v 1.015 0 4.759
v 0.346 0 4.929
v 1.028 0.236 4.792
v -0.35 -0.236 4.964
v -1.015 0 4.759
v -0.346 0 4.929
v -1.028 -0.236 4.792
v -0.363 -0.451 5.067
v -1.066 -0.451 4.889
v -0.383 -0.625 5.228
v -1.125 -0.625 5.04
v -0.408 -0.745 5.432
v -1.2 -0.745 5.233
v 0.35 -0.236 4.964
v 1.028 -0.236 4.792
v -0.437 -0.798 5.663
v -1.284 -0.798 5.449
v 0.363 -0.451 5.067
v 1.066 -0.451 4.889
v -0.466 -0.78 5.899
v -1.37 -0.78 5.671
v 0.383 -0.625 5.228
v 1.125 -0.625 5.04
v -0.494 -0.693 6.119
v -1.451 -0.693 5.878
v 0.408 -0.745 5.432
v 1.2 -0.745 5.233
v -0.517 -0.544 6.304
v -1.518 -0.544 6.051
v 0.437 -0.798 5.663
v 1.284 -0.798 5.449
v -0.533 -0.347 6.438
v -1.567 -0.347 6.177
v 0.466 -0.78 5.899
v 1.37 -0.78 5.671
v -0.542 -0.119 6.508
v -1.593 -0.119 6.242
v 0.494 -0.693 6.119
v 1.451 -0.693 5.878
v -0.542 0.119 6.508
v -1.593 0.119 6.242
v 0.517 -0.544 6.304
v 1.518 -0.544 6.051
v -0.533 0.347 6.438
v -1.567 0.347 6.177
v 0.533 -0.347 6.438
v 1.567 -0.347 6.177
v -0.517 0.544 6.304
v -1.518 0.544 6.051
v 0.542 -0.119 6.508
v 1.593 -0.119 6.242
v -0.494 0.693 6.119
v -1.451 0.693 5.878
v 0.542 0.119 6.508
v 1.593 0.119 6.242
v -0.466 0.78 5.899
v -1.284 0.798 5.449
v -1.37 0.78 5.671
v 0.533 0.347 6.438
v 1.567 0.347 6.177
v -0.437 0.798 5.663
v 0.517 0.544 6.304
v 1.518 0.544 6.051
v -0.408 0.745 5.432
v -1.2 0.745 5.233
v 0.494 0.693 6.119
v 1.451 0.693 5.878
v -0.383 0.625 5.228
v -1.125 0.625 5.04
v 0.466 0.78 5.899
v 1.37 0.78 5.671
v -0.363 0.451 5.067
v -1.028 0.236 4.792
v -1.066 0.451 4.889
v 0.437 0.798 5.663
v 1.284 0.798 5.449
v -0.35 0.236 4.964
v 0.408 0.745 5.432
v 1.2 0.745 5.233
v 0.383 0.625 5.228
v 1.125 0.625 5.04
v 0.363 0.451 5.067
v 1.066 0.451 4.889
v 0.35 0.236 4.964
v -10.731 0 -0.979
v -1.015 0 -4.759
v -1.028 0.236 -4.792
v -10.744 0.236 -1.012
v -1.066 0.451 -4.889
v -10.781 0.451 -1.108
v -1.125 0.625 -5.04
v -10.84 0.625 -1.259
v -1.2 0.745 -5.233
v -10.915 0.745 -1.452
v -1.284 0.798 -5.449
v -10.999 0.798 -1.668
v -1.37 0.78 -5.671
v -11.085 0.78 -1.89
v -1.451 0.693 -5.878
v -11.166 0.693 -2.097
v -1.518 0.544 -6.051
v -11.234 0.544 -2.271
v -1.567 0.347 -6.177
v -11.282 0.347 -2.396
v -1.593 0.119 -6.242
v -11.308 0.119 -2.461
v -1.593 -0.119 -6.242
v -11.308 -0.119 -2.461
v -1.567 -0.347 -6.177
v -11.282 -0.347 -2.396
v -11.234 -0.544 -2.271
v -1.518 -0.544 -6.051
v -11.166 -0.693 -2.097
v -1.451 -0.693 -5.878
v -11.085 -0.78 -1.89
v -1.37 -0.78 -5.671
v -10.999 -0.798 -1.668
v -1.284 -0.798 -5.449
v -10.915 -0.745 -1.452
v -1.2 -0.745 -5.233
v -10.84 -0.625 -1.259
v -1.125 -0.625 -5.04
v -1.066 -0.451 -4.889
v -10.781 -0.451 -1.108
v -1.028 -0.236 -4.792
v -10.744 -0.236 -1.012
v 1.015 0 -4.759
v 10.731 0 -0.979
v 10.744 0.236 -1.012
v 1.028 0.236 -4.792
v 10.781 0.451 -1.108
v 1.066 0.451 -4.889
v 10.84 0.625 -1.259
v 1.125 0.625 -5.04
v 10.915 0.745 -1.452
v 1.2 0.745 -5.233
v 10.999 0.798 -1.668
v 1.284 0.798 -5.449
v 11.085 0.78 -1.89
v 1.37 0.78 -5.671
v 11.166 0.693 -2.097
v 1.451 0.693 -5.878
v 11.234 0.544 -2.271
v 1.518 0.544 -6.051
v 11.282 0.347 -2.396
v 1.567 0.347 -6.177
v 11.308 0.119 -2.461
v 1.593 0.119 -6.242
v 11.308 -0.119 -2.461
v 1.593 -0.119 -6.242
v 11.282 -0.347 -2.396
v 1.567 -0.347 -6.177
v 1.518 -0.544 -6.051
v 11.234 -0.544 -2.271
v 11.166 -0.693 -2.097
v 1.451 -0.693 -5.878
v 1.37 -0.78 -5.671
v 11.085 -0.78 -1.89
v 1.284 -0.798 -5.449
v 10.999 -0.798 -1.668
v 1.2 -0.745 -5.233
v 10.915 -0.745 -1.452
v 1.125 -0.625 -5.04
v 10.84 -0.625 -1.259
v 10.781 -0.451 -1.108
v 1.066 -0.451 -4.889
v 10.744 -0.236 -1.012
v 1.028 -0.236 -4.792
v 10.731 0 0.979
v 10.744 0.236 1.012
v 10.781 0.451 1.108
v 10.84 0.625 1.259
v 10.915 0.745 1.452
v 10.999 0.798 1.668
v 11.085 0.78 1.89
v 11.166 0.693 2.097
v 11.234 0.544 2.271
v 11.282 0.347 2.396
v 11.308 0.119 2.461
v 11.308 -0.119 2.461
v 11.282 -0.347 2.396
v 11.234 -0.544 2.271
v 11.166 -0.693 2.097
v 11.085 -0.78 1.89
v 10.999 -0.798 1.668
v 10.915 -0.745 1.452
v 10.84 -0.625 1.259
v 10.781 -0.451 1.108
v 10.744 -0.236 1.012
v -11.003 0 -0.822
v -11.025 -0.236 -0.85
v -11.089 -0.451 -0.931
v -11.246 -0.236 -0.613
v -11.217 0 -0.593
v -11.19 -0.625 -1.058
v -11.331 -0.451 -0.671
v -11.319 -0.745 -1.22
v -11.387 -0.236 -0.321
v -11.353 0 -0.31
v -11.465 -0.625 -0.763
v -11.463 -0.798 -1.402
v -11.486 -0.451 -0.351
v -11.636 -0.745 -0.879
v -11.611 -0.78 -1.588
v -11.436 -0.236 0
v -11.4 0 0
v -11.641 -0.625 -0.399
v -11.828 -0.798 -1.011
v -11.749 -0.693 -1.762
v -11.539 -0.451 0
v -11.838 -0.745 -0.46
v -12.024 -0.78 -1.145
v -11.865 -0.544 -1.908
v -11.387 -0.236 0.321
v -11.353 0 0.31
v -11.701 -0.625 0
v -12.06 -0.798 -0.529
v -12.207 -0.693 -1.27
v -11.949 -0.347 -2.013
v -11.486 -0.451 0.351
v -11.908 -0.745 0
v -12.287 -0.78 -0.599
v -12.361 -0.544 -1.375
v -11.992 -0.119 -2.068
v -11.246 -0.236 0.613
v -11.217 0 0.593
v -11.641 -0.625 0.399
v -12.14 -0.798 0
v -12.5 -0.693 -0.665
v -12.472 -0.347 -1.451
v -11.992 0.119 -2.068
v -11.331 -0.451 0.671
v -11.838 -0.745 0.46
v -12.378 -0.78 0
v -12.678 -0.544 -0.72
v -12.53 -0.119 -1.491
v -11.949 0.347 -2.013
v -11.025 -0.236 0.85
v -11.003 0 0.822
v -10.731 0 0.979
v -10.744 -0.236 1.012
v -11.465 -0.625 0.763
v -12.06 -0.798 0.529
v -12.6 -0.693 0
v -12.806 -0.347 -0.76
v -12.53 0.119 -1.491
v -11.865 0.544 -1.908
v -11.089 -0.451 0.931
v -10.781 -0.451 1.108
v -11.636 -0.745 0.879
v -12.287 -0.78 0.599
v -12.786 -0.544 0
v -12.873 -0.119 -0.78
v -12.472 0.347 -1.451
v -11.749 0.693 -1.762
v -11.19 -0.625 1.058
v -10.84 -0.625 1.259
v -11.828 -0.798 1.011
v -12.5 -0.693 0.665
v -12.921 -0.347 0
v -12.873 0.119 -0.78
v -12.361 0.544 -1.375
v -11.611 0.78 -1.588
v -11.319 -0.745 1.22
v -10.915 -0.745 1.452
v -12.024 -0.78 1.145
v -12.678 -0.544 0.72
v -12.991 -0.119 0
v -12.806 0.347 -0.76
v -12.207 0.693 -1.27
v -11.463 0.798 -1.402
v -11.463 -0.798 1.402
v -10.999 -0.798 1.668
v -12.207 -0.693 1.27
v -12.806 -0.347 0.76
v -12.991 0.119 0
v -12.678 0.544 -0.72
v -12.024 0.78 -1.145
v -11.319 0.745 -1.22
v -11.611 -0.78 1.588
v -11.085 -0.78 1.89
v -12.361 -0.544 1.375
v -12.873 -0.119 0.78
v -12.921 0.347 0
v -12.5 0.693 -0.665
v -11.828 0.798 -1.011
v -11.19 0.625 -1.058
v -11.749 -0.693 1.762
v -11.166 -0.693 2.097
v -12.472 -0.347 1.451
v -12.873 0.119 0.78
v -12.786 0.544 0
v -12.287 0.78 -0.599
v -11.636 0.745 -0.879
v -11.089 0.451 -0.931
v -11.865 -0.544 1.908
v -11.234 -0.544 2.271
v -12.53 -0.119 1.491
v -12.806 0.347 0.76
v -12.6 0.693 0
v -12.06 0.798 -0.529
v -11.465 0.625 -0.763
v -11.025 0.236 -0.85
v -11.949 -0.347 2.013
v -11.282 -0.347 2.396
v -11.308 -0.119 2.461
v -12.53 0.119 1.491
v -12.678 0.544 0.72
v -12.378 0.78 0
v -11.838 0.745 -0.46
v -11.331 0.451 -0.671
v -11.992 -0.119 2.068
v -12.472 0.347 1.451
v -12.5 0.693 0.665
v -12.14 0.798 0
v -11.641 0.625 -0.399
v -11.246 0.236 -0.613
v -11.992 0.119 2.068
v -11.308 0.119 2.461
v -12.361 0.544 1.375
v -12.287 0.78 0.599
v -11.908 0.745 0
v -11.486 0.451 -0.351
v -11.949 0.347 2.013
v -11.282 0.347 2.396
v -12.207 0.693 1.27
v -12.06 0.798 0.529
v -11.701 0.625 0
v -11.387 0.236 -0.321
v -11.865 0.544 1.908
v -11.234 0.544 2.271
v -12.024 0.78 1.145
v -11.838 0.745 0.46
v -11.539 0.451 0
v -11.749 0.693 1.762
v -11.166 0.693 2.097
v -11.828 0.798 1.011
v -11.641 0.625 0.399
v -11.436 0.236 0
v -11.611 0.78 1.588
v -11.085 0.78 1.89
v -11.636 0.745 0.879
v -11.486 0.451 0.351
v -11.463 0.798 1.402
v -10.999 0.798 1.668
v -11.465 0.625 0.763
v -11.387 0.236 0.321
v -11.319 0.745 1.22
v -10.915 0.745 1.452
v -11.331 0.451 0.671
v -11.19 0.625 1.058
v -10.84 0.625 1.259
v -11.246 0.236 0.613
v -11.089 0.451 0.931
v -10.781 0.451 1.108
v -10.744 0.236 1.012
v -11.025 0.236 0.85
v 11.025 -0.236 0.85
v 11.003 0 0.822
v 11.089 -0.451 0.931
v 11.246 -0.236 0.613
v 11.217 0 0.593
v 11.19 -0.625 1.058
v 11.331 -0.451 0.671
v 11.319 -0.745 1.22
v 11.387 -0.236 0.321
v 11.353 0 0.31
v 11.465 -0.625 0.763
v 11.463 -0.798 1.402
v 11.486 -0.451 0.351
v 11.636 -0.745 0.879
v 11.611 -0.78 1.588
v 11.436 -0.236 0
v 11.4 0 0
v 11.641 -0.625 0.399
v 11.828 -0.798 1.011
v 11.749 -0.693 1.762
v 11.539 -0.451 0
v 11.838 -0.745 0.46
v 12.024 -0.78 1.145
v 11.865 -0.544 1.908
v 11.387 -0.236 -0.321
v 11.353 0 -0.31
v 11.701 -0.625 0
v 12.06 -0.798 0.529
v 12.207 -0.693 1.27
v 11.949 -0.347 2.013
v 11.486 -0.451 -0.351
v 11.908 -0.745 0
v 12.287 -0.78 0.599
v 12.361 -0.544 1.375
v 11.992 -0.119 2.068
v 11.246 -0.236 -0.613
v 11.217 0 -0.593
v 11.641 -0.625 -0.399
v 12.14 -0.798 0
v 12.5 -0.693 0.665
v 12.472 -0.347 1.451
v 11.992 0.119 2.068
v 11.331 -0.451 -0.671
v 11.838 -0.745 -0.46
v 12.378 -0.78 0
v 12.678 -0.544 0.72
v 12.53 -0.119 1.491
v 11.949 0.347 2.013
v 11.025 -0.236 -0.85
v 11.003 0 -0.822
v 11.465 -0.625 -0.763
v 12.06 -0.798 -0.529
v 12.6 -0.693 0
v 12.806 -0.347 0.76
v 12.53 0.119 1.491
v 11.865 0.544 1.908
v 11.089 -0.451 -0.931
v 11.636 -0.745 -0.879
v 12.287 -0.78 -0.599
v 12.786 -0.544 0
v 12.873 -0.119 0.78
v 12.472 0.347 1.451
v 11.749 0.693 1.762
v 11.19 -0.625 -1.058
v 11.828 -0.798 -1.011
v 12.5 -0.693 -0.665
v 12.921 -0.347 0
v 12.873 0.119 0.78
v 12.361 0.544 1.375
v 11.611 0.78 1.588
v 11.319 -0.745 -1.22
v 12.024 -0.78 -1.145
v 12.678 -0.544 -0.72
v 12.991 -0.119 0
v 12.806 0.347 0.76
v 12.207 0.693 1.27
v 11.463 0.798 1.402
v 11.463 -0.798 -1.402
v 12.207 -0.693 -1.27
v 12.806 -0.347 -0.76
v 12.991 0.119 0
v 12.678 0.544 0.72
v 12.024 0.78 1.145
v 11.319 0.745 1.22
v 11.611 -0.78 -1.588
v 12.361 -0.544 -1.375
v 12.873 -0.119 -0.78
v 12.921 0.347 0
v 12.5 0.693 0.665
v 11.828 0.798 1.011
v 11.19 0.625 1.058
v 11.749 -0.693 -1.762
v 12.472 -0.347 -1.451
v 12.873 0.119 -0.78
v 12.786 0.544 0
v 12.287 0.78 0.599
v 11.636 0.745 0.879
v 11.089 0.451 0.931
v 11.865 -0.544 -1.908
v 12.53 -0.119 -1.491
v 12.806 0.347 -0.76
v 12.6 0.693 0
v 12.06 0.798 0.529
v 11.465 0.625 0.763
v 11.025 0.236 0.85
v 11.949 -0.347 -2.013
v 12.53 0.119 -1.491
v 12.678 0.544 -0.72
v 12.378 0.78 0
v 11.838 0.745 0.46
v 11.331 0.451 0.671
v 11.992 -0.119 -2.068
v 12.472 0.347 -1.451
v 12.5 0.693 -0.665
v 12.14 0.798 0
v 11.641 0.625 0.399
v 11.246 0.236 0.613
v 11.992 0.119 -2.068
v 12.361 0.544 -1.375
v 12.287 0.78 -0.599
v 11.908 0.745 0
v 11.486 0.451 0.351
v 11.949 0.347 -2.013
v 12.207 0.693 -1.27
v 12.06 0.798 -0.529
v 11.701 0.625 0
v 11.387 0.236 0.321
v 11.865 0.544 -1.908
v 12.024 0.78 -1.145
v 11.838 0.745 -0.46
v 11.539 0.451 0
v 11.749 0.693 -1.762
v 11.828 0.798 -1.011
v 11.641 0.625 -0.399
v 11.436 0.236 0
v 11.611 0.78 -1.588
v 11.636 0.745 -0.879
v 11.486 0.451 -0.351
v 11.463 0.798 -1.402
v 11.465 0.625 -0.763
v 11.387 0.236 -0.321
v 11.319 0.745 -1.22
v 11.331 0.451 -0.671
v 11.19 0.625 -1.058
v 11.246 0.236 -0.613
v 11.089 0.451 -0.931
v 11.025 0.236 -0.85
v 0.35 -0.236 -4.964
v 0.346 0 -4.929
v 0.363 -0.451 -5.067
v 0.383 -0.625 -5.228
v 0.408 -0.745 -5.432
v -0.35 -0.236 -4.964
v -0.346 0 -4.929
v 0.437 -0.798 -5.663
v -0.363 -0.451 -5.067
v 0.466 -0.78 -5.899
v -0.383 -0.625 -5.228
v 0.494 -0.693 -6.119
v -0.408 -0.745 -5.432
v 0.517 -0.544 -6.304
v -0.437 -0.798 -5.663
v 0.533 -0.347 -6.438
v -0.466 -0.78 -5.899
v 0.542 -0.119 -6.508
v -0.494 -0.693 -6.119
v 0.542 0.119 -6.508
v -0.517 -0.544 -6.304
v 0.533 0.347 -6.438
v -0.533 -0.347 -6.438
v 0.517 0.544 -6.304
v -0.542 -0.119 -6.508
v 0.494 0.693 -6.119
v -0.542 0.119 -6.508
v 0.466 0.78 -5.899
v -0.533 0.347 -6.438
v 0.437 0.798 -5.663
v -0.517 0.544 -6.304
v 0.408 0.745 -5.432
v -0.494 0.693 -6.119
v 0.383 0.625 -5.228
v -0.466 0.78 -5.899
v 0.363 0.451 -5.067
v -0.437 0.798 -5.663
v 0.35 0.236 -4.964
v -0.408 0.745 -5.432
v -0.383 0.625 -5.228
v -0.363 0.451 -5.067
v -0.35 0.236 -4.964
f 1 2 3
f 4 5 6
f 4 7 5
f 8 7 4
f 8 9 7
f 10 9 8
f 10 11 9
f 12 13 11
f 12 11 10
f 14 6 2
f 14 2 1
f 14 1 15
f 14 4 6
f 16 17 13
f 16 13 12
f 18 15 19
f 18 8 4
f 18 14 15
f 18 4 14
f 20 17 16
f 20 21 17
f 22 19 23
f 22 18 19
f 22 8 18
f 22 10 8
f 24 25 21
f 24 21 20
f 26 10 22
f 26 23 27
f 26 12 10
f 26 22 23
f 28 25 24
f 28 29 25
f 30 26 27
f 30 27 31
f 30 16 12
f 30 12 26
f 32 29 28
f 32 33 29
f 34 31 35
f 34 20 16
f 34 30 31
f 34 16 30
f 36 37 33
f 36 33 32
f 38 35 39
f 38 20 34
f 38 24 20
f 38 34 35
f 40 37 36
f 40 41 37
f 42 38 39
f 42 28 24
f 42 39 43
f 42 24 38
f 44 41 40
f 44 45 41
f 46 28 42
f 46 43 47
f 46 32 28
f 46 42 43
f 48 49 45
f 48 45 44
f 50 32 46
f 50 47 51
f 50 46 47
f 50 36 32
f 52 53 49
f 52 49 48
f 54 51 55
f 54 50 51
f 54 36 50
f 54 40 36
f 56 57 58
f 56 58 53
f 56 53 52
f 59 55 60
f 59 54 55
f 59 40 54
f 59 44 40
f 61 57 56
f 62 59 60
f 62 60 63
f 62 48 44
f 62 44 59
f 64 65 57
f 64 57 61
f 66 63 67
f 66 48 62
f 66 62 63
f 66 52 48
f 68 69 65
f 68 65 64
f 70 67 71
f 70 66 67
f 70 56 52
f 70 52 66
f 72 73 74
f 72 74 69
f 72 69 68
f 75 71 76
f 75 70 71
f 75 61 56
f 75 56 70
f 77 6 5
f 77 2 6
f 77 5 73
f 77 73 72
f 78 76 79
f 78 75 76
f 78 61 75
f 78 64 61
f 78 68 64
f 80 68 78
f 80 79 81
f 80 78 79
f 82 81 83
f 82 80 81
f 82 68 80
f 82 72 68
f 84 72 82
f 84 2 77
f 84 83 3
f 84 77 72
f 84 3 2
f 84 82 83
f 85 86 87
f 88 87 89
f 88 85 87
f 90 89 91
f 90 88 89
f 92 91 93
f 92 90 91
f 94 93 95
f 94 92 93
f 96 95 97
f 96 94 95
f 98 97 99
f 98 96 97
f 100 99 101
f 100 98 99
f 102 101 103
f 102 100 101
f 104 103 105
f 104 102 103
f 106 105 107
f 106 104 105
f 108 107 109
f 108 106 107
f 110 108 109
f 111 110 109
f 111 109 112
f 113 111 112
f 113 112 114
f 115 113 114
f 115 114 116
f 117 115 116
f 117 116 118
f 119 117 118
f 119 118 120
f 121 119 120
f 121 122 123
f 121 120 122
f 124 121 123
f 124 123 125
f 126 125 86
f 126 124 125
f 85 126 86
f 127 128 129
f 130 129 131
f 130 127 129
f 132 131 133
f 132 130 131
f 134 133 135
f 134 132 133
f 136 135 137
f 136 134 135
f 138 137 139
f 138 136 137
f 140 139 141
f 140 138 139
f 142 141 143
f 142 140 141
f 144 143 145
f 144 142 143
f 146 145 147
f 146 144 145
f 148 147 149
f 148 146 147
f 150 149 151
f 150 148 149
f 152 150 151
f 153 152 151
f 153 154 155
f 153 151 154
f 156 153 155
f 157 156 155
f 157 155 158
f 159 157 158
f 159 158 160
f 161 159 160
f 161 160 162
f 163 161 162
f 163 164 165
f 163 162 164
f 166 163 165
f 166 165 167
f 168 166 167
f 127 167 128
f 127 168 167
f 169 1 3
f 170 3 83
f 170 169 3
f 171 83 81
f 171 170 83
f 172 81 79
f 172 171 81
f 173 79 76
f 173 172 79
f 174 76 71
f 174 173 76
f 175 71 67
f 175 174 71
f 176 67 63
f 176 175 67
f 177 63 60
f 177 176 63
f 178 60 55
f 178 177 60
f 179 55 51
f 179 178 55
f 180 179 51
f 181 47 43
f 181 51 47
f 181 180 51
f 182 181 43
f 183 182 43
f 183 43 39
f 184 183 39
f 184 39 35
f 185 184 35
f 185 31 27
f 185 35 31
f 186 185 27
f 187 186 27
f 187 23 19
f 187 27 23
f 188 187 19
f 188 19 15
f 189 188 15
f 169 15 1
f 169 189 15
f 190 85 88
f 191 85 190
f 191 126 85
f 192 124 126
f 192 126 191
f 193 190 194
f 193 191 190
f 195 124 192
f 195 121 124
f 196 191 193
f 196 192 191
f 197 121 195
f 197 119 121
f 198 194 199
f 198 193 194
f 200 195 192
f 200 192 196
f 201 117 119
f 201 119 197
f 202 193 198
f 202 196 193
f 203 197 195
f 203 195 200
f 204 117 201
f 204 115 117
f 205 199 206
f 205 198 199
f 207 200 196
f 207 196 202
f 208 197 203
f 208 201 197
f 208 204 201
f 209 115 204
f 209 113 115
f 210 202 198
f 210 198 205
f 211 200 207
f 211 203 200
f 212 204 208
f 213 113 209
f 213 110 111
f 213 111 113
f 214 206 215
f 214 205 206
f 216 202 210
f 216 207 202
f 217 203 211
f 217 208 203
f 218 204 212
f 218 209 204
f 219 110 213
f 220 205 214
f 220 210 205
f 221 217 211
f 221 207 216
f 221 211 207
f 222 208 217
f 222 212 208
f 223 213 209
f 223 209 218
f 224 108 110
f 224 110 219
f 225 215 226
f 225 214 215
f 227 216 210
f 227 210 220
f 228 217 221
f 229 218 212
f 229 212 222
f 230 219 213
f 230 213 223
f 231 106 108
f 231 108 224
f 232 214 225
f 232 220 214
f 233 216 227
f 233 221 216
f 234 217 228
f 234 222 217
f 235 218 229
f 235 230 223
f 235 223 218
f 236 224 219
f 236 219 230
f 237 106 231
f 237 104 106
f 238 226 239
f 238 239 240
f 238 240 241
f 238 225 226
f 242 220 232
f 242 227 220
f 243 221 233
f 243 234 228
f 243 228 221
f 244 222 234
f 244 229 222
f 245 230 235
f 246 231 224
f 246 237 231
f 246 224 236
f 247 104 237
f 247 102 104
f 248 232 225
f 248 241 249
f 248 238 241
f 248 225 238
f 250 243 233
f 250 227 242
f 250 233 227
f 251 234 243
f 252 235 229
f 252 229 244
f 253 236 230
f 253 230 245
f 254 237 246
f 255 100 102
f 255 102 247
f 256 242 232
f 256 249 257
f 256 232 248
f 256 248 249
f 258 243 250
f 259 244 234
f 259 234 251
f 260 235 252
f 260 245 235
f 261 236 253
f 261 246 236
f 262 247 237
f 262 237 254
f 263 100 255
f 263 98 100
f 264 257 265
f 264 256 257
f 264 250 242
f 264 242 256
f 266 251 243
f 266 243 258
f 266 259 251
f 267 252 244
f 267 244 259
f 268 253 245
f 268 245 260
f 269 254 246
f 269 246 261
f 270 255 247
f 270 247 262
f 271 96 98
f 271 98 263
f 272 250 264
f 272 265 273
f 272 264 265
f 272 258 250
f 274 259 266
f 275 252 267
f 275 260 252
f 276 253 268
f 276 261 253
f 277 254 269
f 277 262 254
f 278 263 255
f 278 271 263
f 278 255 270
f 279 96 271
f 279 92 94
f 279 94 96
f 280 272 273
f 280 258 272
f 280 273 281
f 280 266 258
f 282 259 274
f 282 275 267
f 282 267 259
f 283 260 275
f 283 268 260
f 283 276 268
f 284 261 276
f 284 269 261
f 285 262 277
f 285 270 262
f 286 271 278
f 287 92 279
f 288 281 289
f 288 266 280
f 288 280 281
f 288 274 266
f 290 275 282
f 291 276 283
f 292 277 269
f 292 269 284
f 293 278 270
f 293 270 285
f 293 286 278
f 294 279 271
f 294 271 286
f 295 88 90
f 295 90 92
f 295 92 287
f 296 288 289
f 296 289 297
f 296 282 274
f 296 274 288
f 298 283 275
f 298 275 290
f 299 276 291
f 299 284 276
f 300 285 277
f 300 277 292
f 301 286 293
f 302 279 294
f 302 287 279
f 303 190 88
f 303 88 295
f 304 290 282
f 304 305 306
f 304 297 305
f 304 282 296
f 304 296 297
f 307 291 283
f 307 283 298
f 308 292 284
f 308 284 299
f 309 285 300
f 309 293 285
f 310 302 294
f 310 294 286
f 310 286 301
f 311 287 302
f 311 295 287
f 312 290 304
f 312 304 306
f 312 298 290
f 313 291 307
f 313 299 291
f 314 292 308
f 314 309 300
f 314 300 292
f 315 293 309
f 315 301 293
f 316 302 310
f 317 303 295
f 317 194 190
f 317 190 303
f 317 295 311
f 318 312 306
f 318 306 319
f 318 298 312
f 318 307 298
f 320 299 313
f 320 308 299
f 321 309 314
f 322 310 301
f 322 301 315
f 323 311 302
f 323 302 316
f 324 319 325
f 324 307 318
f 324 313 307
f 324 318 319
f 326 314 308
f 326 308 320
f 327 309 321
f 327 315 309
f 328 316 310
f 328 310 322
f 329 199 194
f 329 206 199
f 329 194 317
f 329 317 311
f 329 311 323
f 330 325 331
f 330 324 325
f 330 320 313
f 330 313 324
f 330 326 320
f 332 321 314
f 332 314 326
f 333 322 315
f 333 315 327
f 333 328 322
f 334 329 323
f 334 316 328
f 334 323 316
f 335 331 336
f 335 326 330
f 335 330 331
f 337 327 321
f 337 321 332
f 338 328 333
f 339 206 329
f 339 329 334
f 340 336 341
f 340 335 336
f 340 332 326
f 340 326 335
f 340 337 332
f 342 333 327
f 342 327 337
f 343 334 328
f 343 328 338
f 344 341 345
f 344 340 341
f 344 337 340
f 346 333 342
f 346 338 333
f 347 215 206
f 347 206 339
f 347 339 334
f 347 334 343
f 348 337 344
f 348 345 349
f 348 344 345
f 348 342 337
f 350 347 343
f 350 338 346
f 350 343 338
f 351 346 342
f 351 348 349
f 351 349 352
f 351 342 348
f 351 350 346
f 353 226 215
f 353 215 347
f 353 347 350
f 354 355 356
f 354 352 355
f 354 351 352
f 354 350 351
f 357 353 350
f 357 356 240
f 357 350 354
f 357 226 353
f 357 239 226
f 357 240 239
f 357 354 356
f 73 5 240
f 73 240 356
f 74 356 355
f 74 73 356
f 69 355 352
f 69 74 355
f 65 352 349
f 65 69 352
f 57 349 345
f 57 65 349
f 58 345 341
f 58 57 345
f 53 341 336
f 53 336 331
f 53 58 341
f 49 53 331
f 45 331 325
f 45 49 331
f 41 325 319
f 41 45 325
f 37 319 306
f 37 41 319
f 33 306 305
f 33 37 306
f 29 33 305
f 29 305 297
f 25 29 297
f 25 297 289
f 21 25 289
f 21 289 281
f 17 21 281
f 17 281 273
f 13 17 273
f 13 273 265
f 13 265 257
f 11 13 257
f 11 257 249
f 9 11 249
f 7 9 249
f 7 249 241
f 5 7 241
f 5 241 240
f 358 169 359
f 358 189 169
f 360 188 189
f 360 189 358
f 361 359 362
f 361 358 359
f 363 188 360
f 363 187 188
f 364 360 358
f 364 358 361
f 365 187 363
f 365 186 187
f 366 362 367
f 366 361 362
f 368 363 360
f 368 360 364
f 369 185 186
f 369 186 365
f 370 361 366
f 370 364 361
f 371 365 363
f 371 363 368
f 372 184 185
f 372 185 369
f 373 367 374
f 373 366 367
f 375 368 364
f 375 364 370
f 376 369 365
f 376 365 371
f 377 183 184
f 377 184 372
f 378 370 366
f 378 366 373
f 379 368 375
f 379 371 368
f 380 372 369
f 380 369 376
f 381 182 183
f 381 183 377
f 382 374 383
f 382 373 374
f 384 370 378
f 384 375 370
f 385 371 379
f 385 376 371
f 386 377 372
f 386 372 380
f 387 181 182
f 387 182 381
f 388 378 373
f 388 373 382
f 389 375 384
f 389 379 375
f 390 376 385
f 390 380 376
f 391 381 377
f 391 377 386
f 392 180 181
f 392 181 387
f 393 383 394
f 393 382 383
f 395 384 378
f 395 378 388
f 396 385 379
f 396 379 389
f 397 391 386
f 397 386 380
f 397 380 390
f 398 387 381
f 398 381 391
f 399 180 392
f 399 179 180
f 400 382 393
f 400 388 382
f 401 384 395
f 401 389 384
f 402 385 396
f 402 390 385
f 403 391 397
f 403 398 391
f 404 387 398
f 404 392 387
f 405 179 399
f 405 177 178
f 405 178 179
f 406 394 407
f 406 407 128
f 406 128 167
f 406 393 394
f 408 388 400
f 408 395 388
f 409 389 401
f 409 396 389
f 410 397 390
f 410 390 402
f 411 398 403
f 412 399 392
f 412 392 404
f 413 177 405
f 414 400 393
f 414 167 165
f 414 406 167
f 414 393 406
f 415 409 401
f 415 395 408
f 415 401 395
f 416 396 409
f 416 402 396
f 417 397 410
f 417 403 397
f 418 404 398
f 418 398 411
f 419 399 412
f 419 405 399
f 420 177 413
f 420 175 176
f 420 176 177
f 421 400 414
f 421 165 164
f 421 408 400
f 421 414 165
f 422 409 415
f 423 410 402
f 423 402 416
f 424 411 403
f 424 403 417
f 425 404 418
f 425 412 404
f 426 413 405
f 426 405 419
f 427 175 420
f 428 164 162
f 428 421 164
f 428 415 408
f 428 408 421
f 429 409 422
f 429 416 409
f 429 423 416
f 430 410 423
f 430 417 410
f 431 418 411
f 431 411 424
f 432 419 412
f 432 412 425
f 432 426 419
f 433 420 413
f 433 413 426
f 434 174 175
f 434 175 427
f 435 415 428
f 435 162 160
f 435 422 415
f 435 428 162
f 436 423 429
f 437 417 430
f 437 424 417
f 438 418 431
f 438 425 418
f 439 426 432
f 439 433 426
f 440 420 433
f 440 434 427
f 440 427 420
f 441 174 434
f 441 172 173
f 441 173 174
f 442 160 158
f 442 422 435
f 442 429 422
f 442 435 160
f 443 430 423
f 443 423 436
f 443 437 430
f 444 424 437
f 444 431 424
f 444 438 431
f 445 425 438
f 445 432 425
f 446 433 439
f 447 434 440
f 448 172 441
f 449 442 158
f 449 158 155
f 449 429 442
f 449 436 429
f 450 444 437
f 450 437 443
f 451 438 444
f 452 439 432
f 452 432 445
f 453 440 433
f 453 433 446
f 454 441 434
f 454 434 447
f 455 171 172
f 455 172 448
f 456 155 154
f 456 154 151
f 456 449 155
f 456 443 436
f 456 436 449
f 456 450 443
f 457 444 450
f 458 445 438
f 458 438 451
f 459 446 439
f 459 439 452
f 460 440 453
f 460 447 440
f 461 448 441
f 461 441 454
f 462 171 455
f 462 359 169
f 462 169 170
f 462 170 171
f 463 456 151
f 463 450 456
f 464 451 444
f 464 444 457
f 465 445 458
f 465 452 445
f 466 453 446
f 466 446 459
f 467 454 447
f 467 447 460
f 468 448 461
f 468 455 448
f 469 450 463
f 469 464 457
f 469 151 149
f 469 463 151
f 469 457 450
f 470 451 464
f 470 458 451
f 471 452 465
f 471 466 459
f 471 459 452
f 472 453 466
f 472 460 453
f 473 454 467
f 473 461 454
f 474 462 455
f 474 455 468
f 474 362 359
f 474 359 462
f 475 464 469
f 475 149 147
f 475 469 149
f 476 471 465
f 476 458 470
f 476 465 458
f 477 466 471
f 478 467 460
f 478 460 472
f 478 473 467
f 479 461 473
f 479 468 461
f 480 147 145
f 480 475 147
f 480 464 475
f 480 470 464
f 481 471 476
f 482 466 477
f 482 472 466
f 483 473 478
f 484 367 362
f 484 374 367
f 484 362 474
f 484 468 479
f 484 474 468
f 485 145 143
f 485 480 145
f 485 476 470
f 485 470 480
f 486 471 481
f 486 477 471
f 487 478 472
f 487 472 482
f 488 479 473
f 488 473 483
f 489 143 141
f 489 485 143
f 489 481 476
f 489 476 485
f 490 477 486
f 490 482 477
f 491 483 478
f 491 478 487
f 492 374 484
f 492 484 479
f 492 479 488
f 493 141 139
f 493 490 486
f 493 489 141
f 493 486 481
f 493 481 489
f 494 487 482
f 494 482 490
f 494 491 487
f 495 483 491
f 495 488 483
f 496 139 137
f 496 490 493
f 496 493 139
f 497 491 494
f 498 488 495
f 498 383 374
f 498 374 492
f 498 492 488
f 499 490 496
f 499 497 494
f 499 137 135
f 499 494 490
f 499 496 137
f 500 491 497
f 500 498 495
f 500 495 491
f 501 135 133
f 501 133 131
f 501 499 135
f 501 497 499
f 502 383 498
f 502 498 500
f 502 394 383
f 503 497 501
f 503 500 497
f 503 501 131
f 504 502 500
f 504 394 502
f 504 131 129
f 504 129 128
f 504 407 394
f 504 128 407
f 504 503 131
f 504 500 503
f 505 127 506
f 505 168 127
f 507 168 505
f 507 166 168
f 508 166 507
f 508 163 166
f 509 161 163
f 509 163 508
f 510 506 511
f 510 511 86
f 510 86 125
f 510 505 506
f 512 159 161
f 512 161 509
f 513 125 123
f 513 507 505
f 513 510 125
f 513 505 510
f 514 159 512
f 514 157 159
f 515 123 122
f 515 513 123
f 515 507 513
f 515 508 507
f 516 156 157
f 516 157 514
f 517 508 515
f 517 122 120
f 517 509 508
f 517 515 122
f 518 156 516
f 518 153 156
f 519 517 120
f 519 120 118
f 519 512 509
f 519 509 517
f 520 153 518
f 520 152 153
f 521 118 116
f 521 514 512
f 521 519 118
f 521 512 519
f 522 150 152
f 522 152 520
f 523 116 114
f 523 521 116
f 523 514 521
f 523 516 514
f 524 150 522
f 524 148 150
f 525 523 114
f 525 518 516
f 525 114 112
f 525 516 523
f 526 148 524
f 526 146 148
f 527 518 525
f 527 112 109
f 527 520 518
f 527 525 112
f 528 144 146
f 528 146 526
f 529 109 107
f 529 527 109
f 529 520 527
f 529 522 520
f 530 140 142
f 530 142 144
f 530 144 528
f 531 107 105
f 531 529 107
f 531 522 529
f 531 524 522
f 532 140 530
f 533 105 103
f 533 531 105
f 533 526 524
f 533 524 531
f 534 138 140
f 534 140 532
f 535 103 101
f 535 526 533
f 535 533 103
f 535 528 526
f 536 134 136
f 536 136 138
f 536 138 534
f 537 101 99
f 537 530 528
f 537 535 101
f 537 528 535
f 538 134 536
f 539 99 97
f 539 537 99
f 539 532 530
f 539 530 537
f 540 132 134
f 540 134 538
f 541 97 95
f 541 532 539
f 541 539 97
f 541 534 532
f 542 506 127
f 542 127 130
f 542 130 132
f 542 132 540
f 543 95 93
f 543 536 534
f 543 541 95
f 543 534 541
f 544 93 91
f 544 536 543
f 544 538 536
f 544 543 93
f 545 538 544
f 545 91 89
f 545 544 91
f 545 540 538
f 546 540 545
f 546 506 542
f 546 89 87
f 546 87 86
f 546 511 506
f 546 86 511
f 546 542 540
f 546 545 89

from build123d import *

# Parameters (mm, degrees)
DIA_R = 0.8


with BuildPart() as part:
    # O-Ring: sweep along a path in FlowPath
    with BuildLine(Plane(origin=(0, 0, 0), x_dir=(1, 0, 0), z_dir=(0, 1, 0))) as o_ring_path:
        Line((-11.020937583, -1.724048364), (-1.305608269, -5.504904924))
        ThreePointArc((-1.305608269, -5.504904924), (0, -5.75), (1.305608269, -5.504904924))
        Line((1.305608269, -5.504904924), (11.020937583, -1.724048364))
        ThreePointArc((11.020937583, -1.724048364), (12.2, 0), (11.020937583, 1.724048364))
        Line((11.020937583, 1.724048364), (1.305608269, 5.504904924))
        ThreePointArc((1.305608269, 5.504904924), (0, 5.75), (-1.305608269, 5.504904924))
        Line((-1.305608269, 5.504904924), (-11.020937583, 1.724048364))
        ThreePointArc((-11.020937583, 1.724048364), (-12.2, 0), (-11.020937583, -1.724048364))
    # Dia → O-Ring (sweep)
    with BuildSketch(Plane(origin=(-1.305608269, 0, 5.504904924), x_dir=(0.3626689636627123, 0, -0.9319180343763149), z_dir=(0.9319180343763149, 0, 0.3626689636627123))):
        Circle(DIA_R)
    sweep(path=o_ring_path.line)


solid = part.part
